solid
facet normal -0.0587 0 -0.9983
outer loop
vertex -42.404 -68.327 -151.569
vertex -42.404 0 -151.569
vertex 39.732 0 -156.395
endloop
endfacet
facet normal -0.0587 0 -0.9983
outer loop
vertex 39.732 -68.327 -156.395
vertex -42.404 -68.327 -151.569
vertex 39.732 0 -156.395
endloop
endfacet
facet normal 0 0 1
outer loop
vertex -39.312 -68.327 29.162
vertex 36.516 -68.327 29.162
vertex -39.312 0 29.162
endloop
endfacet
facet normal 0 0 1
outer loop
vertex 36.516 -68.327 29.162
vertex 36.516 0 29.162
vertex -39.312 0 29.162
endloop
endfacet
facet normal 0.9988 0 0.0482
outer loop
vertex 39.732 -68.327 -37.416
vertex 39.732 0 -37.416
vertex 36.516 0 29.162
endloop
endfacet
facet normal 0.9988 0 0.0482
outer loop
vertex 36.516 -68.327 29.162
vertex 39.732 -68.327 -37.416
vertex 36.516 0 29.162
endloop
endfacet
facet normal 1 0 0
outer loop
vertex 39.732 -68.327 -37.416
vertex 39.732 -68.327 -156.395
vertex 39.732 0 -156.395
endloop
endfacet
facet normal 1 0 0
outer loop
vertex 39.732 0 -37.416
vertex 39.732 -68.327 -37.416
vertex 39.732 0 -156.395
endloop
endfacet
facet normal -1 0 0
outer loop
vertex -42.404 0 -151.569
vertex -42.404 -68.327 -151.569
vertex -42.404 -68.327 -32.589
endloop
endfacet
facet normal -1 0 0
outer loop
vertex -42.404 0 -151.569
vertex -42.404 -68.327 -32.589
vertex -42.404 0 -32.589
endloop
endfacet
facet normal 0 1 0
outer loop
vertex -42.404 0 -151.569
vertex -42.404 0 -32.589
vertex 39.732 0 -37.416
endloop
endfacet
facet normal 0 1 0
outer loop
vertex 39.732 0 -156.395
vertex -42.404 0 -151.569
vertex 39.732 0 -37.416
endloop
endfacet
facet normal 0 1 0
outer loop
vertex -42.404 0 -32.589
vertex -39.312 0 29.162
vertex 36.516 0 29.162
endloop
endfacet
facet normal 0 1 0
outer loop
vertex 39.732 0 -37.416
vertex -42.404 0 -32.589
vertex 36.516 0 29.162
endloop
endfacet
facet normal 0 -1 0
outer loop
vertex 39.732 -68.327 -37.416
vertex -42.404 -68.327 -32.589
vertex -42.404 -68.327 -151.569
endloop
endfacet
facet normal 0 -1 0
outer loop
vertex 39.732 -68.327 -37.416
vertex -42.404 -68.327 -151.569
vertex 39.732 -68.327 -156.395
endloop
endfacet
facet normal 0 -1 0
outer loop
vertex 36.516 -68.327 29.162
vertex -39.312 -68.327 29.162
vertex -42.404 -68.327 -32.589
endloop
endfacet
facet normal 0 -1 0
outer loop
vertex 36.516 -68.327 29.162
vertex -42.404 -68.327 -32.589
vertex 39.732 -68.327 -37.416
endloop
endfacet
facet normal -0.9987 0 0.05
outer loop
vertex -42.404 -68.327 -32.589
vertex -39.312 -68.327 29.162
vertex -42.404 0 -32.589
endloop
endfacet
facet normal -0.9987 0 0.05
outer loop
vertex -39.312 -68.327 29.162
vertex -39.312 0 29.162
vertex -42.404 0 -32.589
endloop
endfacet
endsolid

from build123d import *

# Parameters (mm, degrees)
F1_DEPTH = 25.4
F2_DEPTH = 42.9268069565
F3_DEPTH = 118.9797818661


# Not quite as in the source:
# - the program builds the solid bodies; features that only make, move or delete a surface that nothing else refers to are left out


with BuildPart() as f1:
    # F0 (on Front) → F1 (new body)
    with BuildSketch(Plane.XZ):
        Polygon((39.7322513163, -37.4155193567), (36.51605919, 29.1617289186), (-39.3116846681, 29.1617289186), (-42.4041748047, -32.5892791152), align=None)
    extrude(amount=F1_DEPTH)

    # F2 (add): a face of the model
    f2_faces = [f1.faces().sort_by_distance(p)[0] for p in [
        (-0.8911665314, -25.4, -3.3616464638),
    ]]
    extrude(f2_faces, amount=F2_DEPTH)

    # F3 (add): faces of the model
    f3_faces = [f1.faces().sort_by_distance(p)[0] for p in [
        (-1.397812739, -34.1634034783, 29.1617289186),
        (38.1241552532, -34.1634034783, -4.1268952191),
        (-1.3359617442, -34.1634034783, -35.002399236),
    ]]
    extrude(f3_faces, amount=-F3_DEPTH, dir=(0, 0, 1))


solid = f1.part
